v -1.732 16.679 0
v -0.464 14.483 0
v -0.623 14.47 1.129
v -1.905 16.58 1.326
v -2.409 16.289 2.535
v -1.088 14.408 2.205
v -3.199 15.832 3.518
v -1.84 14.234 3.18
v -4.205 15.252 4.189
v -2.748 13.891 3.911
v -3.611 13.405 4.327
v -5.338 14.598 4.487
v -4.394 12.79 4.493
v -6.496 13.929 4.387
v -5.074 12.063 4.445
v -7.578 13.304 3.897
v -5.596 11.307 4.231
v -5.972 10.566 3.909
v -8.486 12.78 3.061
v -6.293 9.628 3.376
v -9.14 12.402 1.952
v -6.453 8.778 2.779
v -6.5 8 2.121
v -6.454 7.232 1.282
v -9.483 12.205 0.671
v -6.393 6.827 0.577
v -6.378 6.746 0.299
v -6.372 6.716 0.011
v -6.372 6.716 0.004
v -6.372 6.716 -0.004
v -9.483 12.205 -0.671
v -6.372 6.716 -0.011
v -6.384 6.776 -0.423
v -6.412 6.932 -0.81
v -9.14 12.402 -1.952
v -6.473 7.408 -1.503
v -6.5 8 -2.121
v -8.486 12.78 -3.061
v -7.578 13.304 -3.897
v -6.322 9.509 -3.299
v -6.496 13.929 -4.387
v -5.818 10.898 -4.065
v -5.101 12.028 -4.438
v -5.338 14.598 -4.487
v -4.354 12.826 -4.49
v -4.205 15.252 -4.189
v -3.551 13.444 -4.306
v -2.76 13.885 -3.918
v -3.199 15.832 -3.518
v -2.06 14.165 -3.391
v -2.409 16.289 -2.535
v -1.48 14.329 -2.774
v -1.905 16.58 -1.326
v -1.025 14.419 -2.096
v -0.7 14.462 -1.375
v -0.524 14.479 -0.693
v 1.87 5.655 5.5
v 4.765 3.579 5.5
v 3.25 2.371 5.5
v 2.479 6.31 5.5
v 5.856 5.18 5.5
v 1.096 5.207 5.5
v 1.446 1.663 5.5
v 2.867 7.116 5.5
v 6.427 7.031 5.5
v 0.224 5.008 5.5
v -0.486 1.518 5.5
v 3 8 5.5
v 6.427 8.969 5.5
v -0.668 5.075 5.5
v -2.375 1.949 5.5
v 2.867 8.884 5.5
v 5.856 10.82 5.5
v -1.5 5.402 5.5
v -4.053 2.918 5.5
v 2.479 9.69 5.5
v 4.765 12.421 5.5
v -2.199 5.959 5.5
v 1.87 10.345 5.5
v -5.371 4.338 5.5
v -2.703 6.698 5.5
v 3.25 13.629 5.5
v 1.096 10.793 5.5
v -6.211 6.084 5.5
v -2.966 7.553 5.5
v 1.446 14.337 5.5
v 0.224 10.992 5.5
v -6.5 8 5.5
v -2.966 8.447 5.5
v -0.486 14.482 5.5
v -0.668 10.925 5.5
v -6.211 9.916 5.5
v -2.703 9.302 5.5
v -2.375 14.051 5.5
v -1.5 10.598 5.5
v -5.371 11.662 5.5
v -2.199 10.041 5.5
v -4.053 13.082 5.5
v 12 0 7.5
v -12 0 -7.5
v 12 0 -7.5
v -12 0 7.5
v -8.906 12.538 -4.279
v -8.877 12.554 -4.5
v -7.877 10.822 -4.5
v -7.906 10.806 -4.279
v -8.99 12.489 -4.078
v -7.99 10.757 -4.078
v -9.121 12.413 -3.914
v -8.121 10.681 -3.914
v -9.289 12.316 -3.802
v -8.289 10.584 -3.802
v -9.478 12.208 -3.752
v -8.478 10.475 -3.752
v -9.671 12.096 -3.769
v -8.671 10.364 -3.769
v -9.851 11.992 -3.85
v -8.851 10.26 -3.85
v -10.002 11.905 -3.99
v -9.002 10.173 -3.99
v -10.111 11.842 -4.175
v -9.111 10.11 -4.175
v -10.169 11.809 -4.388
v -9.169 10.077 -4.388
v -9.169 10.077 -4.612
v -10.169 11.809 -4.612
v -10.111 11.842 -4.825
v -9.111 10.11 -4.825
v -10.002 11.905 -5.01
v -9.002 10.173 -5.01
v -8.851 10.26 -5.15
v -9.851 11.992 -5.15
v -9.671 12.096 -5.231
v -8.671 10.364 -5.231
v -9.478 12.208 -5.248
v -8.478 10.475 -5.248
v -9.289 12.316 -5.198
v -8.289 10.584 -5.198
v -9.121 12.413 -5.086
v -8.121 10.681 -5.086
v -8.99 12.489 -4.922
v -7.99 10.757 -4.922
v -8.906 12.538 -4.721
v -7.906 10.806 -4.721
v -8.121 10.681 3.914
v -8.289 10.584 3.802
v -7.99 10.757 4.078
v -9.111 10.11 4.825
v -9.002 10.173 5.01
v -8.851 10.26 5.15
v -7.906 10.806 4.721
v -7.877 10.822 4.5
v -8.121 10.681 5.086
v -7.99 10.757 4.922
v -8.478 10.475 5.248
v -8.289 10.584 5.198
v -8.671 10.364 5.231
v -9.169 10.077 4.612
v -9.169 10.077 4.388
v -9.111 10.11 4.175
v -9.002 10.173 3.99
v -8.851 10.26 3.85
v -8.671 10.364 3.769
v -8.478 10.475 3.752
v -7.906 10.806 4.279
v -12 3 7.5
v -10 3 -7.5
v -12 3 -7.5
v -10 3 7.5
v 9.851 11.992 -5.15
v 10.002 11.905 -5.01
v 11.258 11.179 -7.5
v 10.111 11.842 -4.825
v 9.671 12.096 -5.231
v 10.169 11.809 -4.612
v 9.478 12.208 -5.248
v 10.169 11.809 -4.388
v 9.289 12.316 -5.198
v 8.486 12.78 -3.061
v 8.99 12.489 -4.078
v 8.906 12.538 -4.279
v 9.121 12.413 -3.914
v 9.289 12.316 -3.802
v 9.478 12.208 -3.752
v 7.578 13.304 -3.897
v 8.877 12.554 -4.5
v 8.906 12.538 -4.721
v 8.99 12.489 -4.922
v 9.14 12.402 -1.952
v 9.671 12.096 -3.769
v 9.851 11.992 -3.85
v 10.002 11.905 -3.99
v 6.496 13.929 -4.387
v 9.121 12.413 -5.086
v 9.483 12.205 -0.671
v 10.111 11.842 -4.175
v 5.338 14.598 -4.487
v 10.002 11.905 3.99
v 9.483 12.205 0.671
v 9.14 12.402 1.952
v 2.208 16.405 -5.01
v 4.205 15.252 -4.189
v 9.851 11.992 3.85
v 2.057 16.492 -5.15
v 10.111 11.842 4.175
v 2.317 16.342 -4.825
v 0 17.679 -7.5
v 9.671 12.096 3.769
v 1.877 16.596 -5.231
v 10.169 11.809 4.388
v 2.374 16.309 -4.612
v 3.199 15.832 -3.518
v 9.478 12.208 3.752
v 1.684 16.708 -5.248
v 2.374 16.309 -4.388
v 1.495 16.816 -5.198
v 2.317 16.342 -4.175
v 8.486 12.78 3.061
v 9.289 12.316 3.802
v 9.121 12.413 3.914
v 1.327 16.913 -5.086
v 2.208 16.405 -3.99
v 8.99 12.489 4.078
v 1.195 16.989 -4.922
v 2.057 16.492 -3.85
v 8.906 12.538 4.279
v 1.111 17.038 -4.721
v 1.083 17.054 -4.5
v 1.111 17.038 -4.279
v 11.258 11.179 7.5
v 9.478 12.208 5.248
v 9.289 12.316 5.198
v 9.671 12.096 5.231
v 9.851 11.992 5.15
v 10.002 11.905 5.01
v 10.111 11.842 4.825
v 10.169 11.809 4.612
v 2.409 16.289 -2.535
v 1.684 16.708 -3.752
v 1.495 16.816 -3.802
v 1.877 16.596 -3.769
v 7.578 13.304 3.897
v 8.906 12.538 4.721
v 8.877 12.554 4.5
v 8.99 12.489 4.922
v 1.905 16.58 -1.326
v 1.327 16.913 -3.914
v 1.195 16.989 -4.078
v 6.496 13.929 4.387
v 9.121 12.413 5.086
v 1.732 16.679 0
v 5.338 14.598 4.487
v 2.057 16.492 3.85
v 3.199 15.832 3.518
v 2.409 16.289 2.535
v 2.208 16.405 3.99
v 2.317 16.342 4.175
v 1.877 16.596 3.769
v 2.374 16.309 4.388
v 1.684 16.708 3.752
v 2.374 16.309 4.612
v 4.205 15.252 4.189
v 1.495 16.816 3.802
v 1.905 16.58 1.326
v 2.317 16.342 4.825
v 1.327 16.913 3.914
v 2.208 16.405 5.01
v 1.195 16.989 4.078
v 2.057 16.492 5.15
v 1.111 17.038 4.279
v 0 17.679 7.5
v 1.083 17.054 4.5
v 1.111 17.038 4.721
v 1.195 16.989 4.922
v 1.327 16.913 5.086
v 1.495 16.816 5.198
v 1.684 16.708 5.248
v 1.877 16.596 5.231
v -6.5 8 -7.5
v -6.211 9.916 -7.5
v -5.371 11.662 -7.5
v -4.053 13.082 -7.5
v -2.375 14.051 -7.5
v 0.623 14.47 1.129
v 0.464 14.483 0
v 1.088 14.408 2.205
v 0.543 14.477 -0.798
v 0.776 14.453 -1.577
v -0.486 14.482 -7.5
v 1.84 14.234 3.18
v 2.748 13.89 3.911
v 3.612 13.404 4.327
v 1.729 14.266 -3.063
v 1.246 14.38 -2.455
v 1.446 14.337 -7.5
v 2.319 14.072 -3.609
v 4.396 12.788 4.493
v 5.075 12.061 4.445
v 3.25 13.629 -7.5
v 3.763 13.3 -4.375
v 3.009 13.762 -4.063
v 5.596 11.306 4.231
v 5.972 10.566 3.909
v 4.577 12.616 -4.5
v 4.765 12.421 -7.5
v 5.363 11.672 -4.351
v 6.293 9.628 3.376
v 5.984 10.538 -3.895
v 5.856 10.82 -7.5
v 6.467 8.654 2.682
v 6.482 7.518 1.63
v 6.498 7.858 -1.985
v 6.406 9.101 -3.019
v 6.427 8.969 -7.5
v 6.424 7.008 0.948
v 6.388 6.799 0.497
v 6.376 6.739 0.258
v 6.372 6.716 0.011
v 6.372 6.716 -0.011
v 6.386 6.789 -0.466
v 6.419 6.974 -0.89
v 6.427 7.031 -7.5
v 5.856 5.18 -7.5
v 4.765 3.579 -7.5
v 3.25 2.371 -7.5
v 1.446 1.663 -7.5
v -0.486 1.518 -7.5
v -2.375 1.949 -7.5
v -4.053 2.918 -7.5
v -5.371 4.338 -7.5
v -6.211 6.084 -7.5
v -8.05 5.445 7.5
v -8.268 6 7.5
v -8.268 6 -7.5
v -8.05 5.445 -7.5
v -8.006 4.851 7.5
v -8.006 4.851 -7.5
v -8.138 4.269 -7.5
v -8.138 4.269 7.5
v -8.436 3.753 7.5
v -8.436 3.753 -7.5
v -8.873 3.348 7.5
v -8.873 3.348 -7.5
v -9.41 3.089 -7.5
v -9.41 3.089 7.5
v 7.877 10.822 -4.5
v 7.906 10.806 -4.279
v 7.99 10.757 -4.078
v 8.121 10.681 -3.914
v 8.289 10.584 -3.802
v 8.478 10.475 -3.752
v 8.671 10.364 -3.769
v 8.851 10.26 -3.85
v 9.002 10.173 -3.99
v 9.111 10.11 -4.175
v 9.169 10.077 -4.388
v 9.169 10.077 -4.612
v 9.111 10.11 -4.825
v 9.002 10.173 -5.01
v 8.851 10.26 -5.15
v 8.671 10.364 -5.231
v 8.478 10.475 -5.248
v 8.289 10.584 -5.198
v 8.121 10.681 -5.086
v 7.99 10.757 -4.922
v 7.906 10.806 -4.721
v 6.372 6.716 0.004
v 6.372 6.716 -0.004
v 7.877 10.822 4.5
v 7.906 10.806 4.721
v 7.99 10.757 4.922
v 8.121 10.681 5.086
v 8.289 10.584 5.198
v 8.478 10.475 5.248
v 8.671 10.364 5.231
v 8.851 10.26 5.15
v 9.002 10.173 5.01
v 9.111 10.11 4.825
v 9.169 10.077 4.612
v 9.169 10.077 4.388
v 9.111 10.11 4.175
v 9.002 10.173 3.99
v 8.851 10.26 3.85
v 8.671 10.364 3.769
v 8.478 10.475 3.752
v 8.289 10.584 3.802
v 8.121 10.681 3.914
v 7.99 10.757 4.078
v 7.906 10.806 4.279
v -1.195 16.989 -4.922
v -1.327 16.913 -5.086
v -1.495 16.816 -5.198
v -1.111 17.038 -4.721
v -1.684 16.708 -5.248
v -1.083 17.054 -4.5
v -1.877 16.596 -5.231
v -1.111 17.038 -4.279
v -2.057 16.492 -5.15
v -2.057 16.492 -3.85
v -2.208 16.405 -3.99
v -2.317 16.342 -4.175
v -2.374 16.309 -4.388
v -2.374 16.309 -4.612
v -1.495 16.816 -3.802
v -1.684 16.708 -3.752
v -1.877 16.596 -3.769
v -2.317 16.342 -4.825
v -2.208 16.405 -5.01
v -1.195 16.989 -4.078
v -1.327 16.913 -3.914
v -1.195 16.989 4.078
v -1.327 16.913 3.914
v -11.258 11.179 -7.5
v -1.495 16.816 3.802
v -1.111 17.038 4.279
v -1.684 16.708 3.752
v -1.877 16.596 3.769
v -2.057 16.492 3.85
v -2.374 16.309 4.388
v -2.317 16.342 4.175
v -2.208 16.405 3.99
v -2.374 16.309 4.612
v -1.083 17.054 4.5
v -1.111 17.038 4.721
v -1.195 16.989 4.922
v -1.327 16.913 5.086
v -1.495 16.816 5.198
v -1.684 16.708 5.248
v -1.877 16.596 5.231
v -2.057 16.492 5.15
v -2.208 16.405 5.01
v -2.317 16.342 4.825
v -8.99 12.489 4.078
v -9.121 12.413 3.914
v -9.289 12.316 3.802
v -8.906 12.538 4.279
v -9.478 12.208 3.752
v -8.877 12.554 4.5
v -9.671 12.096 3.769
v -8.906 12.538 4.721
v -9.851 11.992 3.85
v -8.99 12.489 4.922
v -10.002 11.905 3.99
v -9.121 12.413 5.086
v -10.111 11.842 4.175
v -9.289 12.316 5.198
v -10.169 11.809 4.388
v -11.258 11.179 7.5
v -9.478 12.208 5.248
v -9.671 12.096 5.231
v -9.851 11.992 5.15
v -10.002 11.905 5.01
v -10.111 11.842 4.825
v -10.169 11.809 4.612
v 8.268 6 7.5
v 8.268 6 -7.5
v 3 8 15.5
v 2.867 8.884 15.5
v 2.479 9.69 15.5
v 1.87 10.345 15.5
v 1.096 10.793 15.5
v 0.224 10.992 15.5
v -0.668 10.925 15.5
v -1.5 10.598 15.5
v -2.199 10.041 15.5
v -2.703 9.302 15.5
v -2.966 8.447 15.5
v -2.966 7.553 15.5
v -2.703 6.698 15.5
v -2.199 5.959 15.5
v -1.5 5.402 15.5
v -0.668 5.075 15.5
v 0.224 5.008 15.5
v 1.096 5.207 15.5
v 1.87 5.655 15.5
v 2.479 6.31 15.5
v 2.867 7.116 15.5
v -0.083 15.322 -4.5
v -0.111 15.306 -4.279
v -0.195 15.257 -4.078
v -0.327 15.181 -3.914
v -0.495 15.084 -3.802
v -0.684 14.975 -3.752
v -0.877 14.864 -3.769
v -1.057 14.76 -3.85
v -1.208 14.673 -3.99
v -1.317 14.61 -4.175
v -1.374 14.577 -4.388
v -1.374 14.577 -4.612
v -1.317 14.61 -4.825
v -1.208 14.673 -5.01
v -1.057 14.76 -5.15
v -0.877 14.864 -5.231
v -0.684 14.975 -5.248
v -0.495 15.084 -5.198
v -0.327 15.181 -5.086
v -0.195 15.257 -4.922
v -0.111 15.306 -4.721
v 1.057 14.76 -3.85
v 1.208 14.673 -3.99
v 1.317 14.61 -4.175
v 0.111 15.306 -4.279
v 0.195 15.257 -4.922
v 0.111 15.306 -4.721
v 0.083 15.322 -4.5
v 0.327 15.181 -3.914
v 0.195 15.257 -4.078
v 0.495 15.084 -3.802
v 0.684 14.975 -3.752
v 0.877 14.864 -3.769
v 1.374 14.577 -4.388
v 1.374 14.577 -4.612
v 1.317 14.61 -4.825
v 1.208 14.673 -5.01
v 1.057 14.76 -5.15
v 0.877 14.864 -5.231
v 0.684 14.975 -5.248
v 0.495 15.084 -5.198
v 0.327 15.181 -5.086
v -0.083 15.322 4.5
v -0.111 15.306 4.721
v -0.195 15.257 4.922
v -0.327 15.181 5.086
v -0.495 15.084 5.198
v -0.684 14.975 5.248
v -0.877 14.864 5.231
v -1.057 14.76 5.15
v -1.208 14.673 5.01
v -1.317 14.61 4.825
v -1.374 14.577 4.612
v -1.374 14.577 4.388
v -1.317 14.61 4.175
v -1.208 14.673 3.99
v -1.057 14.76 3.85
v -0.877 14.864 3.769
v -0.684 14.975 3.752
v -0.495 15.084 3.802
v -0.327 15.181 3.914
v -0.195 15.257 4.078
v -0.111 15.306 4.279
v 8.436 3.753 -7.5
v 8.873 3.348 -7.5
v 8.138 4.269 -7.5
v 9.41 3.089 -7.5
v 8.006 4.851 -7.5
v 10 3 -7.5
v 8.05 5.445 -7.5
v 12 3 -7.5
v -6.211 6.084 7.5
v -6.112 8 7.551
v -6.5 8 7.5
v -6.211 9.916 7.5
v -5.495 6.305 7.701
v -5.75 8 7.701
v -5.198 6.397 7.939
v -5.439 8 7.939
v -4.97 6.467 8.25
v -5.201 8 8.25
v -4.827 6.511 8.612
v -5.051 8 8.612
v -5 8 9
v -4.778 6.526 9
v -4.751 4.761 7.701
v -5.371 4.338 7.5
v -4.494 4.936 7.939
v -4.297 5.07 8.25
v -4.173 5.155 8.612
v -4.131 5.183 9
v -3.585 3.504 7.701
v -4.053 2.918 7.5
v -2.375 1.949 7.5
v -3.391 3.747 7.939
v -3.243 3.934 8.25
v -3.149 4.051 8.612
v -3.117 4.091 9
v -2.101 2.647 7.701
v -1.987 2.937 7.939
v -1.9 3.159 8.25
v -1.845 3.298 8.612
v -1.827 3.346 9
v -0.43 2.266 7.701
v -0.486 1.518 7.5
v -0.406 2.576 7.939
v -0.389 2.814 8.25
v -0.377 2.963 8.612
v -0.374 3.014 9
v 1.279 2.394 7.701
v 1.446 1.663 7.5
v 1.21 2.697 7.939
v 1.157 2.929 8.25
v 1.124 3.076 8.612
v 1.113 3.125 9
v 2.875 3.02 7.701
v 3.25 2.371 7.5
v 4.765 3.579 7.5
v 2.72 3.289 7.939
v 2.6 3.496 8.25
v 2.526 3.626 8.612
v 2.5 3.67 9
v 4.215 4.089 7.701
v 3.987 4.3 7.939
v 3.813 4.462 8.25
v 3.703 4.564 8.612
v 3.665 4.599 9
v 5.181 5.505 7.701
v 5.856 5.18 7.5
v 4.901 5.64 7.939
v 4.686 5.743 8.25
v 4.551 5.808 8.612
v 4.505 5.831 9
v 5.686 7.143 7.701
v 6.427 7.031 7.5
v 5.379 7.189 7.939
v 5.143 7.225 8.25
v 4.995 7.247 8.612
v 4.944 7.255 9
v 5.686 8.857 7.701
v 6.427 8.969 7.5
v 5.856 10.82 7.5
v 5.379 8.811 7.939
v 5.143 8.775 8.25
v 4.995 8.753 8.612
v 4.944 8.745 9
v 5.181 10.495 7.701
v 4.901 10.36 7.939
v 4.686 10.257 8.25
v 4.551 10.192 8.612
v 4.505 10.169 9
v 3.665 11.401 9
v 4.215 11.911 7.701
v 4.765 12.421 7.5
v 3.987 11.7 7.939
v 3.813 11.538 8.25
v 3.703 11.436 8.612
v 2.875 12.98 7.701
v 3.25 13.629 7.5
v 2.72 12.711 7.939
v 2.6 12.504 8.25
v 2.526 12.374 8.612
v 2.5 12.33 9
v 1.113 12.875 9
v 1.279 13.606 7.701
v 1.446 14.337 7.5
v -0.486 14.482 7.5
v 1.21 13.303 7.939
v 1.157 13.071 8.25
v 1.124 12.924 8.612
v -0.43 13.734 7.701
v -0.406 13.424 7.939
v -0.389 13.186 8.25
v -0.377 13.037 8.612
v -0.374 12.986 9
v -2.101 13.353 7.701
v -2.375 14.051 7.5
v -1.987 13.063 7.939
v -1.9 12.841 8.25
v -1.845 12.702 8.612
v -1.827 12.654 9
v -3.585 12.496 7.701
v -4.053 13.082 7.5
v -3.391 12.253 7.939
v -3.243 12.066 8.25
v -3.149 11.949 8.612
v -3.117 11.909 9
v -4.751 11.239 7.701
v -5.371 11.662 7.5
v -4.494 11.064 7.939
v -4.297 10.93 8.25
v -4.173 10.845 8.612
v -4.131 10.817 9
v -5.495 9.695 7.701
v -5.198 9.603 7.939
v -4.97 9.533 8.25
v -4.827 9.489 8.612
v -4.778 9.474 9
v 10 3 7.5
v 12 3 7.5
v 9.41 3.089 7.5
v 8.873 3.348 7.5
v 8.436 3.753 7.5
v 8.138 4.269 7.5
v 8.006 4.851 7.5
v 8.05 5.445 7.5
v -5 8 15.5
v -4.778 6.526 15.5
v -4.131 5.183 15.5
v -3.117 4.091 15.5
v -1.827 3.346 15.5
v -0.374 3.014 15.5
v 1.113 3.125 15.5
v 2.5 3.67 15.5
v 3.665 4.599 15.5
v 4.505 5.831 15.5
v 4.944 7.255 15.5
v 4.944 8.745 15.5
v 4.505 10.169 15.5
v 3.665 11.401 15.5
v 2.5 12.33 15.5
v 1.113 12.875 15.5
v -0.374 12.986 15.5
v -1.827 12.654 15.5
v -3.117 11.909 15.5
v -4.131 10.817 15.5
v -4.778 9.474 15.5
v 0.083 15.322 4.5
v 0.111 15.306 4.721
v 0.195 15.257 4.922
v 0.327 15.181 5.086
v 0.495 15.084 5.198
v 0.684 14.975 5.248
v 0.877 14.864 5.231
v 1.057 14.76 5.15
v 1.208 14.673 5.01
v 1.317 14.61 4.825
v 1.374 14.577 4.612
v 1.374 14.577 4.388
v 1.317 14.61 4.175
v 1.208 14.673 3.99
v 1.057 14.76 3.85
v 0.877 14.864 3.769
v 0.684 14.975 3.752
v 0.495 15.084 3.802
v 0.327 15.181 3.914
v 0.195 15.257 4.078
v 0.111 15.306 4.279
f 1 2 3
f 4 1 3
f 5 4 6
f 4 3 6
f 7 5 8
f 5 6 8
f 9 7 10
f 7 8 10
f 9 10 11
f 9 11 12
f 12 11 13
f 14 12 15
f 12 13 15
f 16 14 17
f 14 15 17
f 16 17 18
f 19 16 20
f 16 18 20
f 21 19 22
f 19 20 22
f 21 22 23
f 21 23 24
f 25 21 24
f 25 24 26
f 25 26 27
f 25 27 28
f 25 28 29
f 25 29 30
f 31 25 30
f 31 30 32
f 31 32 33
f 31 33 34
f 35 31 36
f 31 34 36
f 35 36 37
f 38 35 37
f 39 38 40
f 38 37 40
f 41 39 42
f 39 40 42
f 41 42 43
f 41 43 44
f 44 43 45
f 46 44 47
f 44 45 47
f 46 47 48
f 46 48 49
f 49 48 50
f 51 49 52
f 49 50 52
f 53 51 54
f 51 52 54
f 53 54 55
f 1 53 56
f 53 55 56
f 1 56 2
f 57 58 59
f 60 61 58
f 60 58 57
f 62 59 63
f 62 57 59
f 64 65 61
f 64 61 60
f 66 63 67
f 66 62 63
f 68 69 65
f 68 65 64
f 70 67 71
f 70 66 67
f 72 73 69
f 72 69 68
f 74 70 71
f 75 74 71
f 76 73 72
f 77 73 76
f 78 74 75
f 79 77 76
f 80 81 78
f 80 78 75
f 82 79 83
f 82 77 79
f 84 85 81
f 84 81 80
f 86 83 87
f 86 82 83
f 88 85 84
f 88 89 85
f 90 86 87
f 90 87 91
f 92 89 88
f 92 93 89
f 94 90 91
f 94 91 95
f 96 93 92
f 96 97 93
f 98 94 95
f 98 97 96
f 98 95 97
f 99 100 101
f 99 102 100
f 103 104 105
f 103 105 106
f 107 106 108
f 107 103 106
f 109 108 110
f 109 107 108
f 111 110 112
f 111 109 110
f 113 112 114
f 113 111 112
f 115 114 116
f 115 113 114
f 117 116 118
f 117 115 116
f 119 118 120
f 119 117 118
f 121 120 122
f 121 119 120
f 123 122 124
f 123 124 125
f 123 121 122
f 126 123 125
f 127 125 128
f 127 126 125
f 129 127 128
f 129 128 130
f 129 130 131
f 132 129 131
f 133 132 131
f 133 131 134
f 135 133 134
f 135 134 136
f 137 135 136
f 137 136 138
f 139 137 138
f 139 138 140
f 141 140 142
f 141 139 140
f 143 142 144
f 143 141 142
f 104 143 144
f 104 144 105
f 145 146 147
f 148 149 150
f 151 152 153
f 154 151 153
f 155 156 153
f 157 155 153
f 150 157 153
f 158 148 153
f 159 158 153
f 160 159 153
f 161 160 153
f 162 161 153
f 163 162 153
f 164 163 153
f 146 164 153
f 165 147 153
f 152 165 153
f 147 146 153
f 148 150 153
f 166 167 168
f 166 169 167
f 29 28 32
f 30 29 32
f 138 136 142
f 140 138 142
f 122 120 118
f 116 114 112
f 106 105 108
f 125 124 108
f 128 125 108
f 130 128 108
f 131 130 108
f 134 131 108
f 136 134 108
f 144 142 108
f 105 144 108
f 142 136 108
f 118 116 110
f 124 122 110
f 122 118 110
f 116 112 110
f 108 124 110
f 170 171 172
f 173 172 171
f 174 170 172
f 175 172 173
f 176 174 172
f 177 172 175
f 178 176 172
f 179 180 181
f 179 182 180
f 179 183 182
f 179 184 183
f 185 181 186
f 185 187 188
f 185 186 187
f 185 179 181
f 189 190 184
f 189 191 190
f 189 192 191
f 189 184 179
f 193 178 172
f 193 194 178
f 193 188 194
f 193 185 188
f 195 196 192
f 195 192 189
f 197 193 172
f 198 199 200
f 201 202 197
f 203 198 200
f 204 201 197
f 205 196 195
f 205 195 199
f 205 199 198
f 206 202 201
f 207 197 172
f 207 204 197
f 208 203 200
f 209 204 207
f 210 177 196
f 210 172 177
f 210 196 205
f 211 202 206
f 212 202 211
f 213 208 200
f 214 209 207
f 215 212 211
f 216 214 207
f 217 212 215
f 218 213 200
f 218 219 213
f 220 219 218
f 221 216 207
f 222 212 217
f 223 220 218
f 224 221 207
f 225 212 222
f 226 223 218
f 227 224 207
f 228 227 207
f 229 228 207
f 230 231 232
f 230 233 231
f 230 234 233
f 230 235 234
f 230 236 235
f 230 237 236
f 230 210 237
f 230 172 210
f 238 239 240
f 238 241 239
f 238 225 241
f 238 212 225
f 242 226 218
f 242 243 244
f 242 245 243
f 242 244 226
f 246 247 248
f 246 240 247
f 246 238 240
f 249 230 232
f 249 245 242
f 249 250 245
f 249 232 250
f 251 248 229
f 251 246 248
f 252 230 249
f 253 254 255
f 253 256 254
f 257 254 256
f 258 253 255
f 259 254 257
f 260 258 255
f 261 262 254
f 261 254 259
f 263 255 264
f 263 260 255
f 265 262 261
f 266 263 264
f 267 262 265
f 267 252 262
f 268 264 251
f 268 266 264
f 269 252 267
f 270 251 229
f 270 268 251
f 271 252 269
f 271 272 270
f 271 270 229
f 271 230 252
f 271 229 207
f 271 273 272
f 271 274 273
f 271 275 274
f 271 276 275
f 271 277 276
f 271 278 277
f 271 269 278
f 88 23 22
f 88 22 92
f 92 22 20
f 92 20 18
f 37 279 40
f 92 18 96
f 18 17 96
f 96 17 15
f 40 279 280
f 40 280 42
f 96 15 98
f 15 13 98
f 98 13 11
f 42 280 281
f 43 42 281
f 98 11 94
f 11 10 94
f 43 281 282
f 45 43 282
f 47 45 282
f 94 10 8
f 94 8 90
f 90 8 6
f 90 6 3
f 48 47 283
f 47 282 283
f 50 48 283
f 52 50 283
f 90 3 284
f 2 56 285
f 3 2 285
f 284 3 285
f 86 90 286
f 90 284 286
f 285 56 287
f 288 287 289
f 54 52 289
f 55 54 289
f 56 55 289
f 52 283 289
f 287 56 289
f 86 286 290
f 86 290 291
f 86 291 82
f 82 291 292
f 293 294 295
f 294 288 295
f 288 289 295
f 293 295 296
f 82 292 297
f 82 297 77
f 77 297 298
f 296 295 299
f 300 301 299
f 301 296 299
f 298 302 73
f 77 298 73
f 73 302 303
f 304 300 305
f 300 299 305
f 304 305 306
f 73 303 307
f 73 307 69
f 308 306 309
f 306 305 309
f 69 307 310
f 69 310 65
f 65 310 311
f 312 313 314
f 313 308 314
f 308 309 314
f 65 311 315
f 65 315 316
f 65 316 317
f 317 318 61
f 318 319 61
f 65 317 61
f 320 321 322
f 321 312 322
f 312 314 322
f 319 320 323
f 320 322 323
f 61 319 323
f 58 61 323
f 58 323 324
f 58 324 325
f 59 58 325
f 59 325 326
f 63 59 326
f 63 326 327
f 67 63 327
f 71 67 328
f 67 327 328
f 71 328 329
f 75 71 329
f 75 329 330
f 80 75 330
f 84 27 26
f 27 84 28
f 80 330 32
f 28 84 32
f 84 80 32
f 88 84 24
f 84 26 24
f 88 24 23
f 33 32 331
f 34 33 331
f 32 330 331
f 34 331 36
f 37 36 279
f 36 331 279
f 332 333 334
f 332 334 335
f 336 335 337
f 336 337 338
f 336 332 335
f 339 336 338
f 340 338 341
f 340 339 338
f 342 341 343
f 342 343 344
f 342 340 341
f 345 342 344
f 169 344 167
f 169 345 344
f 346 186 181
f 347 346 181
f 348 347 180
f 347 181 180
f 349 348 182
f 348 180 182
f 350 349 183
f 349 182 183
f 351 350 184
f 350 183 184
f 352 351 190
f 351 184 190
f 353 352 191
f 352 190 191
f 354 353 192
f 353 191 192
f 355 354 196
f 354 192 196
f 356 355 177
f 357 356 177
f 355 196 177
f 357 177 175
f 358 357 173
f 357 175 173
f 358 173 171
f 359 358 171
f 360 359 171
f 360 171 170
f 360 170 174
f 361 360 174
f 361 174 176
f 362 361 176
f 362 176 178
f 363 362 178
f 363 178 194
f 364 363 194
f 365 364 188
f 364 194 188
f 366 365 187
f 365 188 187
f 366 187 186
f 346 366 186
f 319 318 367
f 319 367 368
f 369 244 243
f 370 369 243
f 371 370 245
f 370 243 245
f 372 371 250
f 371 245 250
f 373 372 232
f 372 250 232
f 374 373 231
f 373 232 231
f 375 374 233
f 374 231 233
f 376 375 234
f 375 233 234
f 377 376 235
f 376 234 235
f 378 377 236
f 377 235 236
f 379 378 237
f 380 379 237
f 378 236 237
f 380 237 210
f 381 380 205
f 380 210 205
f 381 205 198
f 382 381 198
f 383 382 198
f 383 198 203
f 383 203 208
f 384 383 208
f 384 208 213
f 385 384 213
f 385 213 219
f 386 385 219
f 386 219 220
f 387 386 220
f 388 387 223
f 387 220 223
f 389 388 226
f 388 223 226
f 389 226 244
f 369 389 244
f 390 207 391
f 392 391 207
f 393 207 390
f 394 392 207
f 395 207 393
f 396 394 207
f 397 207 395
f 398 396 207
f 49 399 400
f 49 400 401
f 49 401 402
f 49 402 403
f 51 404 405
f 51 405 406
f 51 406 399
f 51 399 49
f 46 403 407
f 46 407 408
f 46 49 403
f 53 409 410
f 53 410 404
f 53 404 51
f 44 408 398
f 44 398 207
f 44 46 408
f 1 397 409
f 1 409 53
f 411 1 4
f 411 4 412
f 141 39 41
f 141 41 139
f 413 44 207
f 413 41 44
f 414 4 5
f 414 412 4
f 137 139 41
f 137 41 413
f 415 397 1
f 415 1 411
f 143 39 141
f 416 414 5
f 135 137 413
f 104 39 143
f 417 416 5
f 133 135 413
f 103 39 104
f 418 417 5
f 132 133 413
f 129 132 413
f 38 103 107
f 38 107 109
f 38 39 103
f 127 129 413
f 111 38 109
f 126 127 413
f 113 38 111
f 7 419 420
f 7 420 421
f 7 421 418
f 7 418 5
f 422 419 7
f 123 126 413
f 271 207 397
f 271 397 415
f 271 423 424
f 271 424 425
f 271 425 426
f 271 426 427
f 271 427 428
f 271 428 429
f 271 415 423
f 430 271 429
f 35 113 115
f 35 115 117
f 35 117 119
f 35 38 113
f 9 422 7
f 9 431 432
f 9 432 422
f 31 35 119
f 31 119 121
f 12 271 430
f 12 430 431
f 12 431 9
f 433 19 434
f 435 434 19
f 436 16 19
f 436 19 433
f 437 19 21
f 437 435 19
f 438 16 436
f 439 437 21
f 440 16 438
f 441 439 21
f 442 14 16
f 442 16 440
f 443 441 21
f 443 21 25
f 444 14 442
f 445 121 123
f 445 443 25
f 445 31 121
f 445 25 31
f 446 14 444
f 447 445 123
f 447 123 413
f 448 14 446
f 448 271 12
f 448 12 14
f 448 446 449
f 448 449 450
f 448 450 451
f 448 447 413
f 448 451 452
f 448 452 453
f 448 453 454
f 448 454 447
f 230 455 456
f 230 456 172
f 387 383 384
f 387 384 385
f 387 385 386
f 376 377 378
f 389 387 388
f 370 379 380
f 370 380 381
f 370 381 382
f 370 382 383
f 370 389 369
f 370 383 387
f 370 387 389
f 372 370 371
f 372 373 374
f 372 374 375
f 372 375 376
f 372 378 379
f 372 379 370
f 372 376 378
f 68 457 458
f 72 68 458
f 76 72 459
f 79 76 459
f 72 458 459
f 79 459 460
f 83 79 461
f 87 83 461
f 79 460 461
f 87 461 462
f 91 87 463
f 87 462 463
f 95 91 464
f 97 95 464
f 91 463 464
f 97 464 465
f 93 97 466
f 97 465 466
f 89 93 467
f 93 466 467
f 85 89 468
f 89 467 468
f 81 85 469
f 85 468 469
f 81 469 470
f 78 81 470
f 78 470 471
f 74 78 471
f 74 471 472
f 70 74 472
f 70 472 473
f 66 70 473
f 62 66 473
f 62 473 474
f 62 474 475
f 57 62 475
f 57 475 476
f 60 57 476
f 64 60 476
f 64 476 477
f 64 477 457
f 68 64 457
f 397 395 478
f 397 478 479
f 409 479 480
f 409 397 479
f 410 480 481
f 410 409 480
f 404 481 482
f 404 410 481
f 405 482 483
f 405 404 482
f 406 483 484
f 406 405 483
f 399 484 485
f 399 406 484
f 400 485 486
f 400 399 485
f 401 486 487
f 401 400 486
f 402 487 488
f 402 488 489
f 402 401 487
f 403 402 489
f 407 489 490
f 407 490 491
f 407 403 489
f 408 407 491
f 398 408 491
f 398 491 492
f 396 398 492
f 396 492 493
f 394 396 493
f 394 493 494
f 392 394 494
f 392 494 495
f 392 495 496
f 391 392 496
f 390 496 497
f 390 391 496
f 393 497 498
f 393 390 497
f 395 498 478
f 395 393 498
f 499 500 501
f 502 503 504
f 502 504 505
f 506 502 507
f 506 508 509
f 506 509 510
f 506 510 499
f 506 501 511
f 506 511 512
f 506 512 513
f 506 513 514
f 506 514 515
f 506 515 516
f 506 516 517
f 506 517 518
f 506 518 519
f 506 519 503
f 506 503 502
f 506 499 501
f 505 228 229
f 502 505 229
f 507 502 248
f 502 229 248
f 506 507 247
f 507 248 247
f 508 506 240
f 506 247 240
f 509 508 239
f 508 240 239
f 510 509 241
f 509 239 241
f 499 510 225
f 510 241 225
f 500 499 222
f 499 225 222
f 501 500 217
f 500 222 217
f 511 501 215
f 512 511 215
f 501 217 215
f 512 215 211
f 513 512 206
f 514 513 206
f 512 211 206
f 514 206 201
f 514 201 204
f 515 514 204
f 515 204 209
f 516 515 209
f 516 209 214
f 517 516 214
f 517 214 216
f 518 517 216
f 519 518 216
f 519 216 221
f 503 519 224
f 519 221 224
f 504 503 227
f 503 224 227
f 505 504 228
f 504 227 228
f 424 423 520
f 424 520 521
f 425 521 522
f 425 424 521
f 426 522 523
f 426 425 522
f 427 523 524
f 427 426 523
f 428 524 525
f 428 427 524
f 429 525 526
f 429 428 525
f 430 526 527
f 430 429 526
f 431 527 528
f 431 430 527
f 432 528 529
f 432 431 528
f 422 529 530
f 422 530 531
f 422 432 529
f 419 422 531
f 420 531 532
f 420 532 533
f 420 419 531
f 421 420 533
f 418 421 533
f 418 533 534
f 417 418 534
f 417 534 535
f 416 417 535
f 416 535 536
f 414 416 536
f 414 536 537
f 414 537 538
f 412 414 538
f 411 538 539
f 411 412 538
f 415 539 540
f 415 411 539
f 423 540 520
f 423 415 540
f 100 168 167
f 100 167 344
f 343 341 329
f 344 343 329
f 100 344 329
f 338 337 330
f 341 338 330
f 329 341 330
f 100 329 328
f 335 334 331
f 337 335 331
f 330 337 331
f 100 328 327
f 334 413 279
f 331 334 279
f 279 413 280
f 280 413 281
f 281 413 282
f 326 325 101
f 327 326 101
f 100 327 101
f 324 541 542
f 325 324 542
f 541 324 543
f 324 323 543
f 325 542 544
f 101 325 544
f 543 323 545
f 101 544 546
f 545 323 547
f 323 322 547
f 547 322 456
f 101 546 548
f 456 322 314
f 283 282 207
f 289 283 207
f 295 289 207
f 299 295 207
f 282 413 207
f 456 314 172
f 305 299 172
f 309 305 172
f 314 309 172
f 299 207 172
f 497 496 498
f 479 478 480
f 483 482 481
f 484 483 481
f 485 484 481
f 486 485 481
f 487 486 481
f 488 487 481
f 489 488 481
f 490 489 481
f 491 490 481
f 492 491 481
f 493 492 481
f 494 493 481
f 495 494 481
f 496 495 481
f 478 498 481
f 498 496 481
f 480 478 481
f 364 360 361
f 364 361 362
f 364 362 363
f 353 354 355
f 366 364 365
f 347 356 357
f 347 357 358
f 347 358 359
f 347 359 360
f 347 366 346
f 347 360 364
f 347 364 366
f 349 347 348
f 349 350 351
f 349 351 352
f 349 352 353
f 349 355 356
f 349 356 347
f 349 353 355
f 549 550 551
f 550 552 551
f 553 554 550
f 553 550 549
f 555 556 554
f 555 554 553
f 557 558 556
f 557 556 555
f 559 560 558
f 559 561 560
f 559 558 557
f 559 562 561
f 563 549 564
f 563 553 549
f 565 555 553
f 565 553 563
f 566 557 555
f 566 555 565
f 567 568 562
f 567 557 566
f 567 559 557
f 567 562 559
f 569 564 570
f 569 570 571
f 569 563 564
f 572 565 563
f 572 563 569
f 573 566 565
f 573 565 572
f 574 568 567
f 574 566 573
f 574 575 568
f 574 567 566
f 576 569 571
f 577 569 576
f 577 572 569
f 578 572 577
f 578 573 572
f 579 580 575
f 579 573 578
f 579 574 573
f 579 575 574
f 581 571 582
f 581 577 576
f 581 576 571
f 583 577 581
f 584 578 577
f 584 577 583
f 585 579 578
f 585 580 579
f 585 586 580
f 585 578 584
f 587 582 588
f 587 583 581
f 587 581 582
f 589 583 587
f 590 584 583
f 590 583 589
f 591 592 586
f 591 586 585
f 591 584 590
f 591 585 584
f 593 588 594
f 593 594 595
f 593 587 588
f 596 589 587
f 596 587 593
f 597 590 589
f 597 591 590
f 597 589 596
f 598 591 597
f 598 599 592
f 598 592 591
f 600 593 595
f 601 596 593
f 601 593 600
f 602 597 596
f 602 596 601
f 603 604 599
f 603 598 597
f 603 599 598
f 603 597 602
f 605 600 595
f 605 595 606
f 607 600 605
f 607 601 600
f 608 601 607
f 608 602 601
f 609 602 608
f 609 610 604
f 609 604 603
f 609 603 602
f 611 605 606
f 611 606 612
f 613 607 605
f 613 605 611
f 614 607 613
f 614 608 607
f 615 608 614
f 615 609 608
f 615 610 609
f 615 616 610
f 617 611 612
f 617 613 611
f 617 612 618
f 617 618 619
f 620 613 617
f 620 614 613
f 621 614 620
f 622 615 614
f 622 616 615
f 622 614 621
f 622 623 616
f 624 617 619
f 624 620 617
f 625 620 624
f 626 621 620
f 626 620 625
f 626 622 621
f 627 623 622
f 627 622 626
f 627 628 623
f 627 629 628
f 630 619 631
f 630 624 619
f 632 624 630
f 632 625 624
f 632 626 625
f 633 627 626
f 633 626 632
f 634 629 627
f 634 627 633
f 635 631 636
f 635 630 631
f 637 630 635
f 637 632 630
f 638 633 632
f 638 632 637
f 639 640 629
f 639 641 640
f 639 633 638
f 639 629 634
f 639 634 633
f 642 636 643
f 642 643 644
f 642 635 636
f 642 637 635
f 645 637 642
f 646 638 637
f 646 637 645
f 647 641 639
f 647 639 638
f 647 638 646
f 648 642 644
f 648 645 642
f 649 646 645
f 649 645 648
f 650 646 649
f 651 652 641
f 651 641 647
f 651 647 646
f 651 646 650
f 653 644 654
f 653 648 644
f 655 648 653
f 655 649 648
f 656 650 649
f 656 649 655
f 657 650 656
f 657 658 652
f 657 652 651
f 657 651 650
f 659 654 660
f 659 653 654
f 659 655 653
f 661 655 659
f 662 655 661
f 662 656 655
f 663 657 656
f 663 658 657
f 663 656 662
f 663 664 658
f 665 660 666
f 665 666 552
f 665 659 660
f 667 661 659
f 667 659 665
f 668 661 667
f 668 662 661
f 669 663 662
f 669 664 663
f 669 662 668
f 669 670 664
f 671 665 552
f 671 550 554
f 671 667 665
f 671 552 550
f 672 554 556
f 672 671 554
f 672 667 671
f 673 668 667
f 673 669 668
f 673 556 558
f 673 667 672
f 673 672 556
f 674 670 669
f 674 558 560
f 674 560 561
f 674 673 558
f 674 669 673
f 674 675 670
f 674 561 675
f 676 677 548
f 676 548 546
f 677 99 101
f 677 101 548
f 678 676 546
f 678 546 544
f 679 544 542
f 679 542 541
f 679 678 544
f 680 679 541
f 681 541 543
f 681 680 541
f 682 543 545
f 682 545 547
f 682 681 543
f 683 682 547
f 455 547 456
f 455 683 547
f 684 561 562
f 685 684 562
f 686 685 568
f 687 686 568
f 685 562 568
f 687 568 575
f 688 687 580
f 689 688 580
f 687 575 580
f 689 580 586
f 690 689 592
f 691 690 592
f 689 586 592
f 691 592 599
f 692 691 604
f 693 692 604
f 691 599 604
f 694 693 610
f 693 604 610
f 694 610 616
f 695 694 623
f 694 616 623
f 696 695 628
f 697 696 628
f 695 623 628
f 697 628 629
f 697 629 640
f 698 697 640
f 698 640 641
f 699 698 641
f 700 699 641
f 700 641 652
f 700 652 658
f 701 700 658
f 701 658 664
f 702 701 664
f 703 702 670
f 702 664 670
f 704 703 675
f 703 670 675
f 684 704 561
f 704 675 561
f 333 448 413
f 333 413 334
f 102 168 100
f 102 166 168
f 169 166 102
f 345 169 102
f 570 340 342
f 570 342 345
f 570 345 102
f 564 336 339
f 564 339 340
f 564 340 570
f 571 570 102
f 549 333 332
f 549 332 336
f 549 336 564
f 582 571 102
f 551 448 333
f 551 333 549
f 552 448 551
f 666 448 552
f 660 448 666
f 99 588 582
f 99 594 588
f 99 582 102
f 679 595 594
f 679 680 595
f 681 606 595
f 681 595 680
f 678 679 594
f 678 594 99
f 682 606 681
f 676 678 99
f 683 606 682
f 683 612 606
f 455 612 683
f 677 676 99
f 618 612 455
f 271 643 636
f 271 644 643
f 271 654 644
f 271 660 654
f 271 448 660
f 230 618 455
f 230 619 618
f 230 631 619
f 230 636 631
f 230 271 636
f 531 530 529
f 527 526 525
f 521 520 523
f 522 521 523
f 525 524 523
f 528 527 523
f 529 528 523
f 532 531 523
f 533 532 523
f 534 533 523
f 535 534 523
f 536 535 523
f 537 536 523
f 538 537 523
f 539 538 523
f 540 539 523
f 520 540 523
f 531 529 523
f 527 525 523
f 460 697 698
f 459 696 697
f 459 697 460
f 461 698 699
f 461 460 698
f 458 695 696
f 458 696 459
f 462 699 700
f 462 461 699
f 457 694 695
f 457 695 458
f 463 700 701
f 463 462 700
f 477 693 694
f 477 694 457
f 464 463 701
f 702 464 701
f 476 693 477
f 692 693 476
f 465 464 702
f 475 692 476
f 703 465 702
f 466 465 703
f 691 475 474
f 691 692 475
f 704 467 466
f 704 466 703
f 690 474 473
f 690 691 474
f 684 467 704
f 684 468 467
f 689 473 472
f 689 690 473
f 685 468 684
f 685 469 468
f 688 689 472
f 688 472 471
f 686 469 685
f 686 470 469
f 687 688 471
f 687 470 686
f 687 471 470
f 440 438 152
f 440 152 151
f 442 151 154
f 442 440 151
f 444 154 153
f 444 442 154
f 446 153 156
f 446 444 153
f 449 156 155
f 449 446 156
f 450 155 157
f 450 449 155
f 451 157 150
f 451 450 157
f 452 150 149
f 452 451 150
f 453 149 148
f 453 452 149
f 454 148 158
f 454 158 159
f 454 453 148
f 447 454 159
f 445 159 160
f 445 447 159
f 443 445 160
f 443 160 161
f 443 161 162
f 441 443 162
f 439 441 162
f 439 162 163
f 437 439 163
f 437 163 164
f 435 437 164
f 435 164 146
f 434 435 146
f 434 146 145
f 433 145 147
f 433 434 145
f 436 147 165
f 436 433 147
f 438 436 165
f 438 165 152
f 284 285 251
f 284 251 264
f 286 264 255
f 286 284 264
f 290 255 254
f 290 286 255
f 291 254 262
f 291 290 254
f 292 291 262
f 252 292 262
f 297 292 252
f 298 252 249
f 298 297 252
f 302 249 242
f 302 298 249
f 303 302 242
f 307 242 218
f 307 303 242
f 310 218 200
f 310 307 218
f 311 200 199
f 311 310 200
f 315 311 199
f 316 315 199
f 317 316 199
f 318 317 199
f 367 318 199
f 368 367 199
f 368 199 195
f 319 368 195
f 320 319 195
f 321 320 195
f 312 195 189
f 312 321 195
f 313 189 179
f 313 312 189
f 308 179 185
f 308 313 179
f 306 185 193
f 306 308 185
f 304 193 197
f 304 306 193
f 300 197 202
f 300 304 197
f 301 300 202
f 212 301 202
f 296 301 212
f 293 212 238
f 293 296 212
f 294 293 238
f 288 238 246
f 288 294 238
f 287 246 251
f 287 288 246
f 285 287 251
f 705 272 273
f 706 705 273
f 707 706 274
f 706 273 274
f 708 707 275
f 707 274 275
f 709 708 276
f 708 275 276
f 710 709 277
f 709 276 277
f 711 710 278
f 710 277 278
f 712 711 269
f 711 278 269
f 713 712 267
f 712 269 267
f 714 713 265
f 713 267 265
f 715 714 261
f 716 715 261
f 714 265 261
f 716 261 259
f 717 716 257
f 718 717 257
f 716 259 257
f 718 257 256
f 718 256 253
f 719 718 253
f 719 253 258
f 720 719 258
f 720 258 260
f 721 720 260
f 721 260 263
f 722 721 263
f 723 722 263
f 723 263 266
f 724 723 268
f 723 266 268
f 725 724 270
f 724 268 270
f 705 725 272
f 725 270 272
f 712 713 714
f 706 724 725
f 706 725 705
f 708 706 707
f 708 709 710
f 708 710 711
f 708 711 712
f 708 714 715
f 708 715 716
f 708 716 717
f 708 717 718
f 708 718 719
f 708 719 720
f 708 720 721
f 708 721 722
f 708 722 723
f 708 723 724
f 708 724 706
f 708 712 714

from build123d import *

# Parameters (mm, degrees)
BOSS_EXTRUDE1_DEPTH = 7.5
SKETCH2_R           = 5
BOSS_EXTRUDE2_DEPTH = 8
SKETCH3_R           = 6.5
CUT_EXTRUDE1_DEPTH  = 13
CUT_EXTRUDE2_REACH  = 25
SKETCH4_R           = 3
CUT_EXTRUDE3_START  = -6.308696
SKETCH5_R           = 4.5
CUT_EXTRUDE3_DEPTH  = 6.308696
SKETCH6_R           = 0.75
CUT_EXTRUDE4_DEPTH  = 2
FILLET1_R           = 1.5


with BuildPart() as part:
    # Sketch1 → Boss-Extrude1 (new body, symmetric)
    with BuildSketch(Plane.XY):
        with BuildLine():
            Line((-12, 0), (12, 0))
            Line((12, 0), (12, 3))
            Line((12, 3), (10, 3))
            ThreePointArc((10, 3), (8.267949192, 4), (8.267949192, 6))
            Line((8.267949192, 6), (11.258330249, 11.179491924))
            Line((11.258330249, 11.179491924), (0, 17.679491924))
            Line((0, 17.679491924), (-11.258330249, 11.179491924))
            Line((-11.258330249, 11.179491924), (-8.267949192, 6))
            ThreePointArc((-8.267949192, 6), (-8.267949192, 4), (-10, 3))
            Line((-10, 3), (-12, 3))
            Line((-12, 3), (-12, 0))
        make_face()
    extrude(amount=BOSS_EXTRUDE1_DEPTH, both=True)

    # Sketch2 → Boss-Extrude2 (add)
    with BuildSketch(Plane.XY.offset(7.5)):
        with Locations(Location((0, 8, 0), (0, 0, 180))):  # turned: the seam where the file's is
            Circle(SKETCH2_R)
    extrude(amount=BOSS_EXTRUDE2_DEPTH)

    # Sketch3 → Cut-Extrude1 (cut)
    with BuildSketch(Plane(origin=(0, 0, -7.5), x_dir=(-1, 0, 0), z_dir=(0, 0, -1))):
        with Locations((0, 8)):
            Circle(SKETCH3_R)
    extrude(amount=-CUT_EXTRUDE1_DEPTH, mode=Mode.SUBTRACT)

    # Sketch4 → Cut-Extrude2 (cut, up to next)
    with BuildSketch(Plane.XY.offset(15.5), mode=Mode.PRIVATE) as cut_extrude2_sk1:
        with Locations((0, 8)):
            Circle(SKETCH4_R)
    cut_extrude2_tool1 = extrude(cut_extrude2_sk1.sketch, amount=-CUT_EXTRUDE2_REACH, mode=Mode.PRIVATE) & part.part
    add(cut_extrude2_tool1.solids().sort_by_distance((0, 8, 15.5))[0], mode=Mode.SUBTRACT)

    # Sketch5 → Cut-Extrude3 (cut)
    with BuildSketch(Plane(origin=(7.655444566, 13.259618943, 0), x_dir=(0.866025404, -0.5, 0), z_dir=(0.5, 0.866025404, 0)).offset(CUT_EXTRUDE3_START)):
        with Locations(Location((-2.339745962, 0, 0), (0, 0, 180))):  # turned: the seam where the file's is
            Circle(SKETCH5_R)
    cut_extrude3 = extrude(amount=CUT_EXTRUDE3_DEPTH, mode=Mode.SUBTRACT)

    # Mirror1: Cut-Extrude3 across plane
    add(cut_extrude3.mirror(Plane(origin=(0, 0, 0), x_dir=(0, 0, 1), z_dir=(1, 0, 0))), mode=Mode.SUBTRACT)

    # Sketch6 → Cut-Extrude4 (cut)
    with BuildSketch(Plane(origin=(7.655444566, 13.259618943, 0), x_dir=(0.866025404, -0.5, 0), z_dir=(0.5, 0.866025404, 0))):
        with Locations(Location((-6.839745962, 4.5, 0), (0, 0, 180))):  # turned: the seam where the file's is
            Circle(SKETCH6_R)
        with Locations(Location((2.160254038, 4.5, 0), (0, 0, 180))):  # turned: the seam where the file's is
            Circle(SKETCH6_R)
        with Locations(Location((2.160254038, -4.5, 0), (0, 0, 180))):  # turned: the seam where the file's is
            Circle(SKETCH6_R)
        with Locations(Location((-6.839745962, -4.5, 0), (0, 0, 180))):  # turned: the seam where the file's is
            Circle(SKETCH6_R)
    cut_extrude4 = extrude(amount=-CUT_EXTRUDE4_DEPTH, mode=Mode.SUBTRACT)

    # Mirror2: Cut-Extrude4 across plane
    add(cut_extrude4.mirror(Plane(origin=(0, 0, 0), x_dir=(0, 0, 1), z_dir=(1, 0, 0))), mode=Mode.SUBTRACT)

    # Fillet1
    fillet1_edges = [part.edges().sort_by_distance(p)[0] for p in [
        (5, 8, 7.5),
    ]]
    fillet(fillet1_edges, radius=FILLET1_R)


solid = part.part
